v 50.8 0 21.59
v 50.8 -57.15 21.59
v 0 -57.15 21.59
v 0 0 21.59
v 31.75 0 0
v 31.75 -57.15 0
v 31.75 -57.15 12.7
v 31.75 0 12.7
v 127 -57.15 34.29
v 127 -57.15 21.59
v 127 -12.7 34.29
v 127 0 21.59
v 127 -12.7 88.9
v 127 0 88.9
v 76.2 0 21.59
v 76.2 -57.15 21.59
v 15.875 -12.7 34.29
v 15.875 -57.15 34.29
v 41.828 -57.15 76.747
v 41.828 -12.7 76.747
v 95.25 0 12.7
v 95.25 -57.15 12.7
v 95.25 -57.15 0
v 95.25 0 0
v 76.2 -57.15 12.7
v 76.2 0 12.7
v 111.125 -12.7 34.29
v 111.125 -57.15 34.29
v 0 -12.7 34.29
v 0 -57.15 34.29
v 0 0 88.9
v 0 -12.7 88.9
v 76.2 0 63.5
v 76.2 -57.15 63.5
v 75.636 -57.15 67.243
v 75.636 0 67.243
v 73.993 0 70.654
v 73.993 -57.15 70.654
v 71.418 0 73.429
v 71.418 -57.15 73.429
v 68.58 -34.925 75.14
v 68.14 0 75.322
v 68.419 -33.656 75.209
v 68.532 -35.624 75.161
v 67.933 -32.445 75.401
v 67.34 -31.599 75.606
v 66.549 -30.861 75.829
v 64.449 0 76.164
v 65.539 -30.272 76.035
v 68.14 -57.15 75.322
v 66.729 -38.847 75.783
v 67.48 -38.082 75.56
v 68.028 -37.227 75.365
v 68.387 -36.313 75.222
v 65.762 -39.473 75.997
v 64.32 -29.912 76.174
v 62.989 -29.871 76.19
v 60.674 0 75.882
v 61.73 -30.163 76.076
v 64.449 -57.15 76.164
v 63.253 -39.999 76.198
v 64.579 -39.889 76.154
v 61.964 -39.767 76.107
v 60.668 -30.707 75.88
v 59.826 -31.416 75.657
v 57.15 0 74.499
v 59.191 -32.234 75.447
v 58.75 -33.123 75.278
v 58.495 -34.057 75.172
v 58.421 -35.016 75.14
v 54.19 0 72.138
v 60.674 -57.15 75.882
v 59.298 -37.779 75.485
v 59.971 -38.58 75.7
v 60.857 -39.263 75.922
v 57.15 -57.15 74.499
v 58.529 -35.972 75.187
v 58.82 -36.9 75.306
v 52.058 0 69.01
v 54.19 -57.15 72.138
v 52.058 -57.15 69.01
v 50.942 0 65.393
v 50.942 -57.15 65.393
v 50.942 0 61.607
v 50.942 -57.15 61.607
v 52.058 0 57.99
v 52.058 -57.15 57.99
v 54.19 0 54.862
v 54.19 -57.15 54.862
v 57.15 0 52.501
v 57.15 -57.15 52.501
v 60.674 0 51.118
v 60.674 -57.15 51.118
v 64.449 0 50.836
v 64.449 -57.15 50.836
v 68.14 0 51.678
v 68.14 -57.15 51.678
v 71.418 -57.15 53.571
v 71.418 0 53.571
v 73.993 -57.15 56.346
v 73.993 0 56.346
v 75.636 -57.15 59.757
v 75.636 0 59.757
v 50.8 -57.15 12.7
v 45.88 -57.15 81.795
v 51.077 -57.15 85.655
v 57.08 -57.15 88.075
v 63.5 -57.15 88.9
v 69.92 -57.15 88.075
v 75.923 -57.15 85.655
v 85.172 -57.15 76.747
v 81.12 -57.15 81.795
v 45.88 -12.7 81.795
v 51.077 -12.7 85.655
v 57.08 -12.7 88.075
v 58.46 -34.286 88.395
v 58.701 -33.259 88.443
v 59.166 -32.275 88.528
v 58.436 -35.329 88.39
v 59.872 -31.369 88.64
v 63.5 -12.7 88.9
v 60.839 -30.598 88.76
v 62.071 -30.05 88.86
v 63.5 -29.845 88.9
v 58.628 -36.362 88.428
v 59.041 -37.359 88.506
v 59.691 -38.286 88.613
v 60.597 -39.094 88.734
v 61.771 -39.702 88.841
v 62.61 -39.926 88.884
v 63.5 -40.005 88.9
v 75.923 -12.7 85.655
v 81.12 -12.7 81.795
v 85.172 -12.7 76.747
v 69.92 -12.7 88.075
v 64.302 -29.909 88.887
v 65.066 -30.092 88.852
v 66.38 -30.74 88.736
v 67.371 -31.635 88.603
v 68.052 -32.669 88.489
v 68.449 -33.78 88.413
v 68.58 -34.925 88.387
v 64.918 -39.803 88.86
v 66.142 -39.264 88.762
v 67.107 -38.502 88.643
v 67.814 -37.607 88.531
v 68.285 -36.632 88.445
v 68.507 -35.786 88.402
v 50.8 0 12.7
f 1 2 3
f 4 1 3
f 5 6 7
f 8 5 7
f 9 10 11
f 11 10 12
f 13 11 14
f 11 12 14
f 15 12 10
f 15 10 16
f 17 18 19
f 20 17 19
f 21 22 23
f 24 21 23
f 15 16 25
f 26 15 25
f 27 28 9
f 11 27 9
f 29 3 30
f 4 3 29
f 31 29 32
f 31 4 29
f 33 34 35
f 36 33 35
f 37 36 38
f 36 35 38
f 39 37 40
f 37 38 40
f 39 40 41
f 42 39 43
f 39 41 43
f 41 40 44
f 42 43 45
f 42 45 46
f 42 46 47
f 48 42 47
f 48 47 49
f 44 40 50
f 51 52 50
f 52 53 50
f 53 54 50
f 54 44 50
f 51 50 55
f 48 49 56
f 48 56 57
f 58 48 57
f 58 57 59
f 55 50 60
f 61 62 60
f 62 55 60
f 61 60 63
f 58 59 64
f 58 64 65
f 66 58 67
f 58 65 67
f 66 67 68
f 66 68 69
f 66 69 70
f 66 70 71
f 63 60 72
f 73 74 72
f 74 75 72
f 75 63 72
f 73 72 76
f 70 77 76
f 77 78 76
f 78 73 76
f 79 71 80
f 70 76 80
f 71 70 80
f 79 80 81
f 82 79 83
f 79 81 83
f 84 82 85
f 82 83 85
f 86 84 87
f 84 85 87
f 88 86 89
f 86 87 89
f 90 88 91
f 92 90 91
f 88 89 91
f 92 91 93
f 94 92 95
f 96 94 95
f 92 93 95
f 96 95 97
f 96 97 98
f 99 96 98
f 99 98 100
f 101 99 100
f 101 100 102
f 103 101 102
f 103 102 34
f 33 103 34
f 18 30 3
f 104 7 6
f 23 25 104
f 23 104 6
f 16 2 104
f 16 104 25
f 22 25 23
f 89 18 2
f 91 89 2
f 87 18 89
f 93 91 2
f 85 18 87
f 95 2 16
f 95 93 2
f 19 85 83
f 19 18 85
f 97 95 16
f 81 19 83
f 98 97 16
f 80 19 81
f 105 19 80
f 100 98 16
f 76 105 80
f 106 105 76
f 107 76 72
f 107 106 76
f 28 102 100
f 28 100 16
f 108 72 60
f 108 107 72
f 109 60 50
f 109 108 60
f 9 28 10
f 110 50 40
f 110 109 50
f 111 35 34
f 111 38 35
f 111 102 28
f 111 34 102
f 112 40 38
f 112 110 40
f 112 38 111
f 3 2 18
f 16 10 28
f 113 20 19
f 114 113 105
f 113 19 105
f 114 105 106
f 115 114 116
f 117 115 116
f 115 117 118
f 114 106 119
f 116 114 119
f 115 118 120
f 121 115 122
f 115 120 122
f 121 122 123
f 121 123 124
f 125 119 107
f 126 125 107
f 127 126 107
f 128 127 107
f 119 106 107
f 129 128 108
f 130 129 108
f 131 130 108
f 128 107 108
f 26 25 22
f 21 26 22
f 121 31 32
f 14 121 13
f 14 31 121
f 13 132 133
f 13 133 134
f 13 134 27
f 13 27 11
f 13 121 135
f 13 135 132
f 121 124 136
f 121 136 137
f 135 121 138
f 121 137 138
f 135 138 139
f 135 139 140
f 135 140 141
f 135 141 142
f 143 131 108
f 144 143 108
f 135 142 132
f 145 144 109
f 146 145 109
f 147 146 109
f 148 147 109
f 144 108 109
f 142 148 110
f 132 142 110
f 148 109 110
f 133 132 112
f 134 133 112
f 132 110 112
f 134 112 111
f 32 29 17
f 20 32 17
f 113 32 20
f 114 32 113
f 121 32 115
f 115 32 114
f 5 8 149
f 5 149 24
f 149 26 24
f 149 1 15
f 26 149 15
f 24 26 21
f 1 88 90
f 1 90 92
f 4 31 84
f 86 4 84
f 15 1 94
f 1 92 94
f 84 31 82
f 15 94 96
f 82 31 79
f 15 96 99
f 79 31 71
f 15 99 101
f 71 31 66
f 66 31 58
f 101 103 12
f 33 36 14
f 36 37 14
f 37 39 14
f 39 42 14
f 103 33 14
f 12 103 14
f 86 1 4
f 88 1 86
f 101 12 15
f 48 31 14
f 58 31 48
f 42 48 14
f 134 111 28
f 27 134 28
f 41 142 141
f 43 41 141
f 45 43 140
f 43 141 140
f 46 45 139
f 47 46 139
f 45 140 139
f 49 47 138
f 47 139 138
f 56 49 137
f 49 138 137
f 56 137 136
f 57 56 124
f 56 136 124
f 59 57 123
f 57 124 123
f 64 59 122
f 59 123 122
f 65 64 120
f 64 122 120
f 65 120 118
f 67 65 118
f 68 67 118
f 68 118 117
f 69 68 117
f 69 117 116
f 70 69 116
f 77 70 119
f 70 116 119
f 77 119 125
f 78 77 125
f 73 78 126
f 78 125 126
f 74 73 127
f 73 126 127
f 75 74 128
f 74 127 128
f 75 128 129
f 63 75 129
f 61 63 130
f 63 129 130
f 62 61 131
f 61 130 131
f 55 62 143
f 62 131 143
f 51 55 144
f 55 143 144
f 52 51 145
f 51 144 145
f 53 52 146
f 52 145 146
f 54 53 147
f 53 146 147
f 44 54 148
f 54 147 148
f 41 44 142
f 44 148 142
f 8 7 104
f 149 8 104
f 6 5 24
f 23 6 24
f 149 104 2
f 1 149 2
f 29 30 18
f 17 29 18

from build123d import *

# Parameters (mm, degrees)
F0_W     = 127
F0_H     = 88.9
F1_DEPTH = 57.15
F2_R     = 12.7
F3_DEPTH = 57.151
F5_DEPTH = 44.45
F6_R     = 5.08
F7_DEPTH = 25.4


with BuildPart() as f1:
    # F0 (on Front) → F1 (new body)
    with BuildSketch(Plane.XZ):
        with Locations((63.5, 44.45)):
            Rectangle(F0_W, F0_H)
    extrude(amount=F1_DEPTH)

    # F2 (on face) → F3 (cut, through all)
    with BuildSketch(Plane.XZ.offset(57.15)):
        with Locations((63.5, 63.5)):
            Circle(F2_R)
        Polygon((127, 0), (127, 21.59), (76.2, 21.59), (76.2, 12.7), (95.25, 12.7), (95.25, 0), align=None)
        Polygon((50.8, 21.59), (0, 21.59), (0, 0), (31.75, 0), (31.75, 12.7), (50.8, 12.7), align=None)
    extrude(amount=-F3_DEPTH, mode=Mode.SUBTRACT)

    # F4 (on face) → F5 (cut)
    with BuildSketch(Plane.XZ.offset(57.15)):
        with BuildLine():
            Line((15.875, 34.29), (41.828237, 76.74744))
            ThreePointArc((41.828237, 76.74744), (51.076735, 85.654514), (63.5, 88.9))
            Line((63.5, 88.9), (0, 88.9))
            Line((0, 88.9), (0, 34.29))
            Line((0, 34.29), (15.875, 34.29))
        make_face()
        with BuildLine():
            ThreePointArc((63.5, 88.9), (75.923265, 85.654514), (85.171763, 76.74744))
            Line((85.171763, 76.74744), (111.125, 34.29))
            Line((111.125, 34.29), (127, 34.29))
            Line((127, 34.29), (127, 88.9))
            Line((127, 88.9), (63.5, 88.9))
        make_face()
    extrude(amount=-F5_DEPTH, mode=Mode.SUBTRACT)

    # F6 (on face) → F7 (cut)
    with BuildSketch(Plane.XY.offset(88.9)):
        with Locations((63.5, -34.925)):
            Circle(F6_R)
    extrude(amount=-F7_DEPTH, mode=Mode.SUBTRACT)


solid = f1.part
